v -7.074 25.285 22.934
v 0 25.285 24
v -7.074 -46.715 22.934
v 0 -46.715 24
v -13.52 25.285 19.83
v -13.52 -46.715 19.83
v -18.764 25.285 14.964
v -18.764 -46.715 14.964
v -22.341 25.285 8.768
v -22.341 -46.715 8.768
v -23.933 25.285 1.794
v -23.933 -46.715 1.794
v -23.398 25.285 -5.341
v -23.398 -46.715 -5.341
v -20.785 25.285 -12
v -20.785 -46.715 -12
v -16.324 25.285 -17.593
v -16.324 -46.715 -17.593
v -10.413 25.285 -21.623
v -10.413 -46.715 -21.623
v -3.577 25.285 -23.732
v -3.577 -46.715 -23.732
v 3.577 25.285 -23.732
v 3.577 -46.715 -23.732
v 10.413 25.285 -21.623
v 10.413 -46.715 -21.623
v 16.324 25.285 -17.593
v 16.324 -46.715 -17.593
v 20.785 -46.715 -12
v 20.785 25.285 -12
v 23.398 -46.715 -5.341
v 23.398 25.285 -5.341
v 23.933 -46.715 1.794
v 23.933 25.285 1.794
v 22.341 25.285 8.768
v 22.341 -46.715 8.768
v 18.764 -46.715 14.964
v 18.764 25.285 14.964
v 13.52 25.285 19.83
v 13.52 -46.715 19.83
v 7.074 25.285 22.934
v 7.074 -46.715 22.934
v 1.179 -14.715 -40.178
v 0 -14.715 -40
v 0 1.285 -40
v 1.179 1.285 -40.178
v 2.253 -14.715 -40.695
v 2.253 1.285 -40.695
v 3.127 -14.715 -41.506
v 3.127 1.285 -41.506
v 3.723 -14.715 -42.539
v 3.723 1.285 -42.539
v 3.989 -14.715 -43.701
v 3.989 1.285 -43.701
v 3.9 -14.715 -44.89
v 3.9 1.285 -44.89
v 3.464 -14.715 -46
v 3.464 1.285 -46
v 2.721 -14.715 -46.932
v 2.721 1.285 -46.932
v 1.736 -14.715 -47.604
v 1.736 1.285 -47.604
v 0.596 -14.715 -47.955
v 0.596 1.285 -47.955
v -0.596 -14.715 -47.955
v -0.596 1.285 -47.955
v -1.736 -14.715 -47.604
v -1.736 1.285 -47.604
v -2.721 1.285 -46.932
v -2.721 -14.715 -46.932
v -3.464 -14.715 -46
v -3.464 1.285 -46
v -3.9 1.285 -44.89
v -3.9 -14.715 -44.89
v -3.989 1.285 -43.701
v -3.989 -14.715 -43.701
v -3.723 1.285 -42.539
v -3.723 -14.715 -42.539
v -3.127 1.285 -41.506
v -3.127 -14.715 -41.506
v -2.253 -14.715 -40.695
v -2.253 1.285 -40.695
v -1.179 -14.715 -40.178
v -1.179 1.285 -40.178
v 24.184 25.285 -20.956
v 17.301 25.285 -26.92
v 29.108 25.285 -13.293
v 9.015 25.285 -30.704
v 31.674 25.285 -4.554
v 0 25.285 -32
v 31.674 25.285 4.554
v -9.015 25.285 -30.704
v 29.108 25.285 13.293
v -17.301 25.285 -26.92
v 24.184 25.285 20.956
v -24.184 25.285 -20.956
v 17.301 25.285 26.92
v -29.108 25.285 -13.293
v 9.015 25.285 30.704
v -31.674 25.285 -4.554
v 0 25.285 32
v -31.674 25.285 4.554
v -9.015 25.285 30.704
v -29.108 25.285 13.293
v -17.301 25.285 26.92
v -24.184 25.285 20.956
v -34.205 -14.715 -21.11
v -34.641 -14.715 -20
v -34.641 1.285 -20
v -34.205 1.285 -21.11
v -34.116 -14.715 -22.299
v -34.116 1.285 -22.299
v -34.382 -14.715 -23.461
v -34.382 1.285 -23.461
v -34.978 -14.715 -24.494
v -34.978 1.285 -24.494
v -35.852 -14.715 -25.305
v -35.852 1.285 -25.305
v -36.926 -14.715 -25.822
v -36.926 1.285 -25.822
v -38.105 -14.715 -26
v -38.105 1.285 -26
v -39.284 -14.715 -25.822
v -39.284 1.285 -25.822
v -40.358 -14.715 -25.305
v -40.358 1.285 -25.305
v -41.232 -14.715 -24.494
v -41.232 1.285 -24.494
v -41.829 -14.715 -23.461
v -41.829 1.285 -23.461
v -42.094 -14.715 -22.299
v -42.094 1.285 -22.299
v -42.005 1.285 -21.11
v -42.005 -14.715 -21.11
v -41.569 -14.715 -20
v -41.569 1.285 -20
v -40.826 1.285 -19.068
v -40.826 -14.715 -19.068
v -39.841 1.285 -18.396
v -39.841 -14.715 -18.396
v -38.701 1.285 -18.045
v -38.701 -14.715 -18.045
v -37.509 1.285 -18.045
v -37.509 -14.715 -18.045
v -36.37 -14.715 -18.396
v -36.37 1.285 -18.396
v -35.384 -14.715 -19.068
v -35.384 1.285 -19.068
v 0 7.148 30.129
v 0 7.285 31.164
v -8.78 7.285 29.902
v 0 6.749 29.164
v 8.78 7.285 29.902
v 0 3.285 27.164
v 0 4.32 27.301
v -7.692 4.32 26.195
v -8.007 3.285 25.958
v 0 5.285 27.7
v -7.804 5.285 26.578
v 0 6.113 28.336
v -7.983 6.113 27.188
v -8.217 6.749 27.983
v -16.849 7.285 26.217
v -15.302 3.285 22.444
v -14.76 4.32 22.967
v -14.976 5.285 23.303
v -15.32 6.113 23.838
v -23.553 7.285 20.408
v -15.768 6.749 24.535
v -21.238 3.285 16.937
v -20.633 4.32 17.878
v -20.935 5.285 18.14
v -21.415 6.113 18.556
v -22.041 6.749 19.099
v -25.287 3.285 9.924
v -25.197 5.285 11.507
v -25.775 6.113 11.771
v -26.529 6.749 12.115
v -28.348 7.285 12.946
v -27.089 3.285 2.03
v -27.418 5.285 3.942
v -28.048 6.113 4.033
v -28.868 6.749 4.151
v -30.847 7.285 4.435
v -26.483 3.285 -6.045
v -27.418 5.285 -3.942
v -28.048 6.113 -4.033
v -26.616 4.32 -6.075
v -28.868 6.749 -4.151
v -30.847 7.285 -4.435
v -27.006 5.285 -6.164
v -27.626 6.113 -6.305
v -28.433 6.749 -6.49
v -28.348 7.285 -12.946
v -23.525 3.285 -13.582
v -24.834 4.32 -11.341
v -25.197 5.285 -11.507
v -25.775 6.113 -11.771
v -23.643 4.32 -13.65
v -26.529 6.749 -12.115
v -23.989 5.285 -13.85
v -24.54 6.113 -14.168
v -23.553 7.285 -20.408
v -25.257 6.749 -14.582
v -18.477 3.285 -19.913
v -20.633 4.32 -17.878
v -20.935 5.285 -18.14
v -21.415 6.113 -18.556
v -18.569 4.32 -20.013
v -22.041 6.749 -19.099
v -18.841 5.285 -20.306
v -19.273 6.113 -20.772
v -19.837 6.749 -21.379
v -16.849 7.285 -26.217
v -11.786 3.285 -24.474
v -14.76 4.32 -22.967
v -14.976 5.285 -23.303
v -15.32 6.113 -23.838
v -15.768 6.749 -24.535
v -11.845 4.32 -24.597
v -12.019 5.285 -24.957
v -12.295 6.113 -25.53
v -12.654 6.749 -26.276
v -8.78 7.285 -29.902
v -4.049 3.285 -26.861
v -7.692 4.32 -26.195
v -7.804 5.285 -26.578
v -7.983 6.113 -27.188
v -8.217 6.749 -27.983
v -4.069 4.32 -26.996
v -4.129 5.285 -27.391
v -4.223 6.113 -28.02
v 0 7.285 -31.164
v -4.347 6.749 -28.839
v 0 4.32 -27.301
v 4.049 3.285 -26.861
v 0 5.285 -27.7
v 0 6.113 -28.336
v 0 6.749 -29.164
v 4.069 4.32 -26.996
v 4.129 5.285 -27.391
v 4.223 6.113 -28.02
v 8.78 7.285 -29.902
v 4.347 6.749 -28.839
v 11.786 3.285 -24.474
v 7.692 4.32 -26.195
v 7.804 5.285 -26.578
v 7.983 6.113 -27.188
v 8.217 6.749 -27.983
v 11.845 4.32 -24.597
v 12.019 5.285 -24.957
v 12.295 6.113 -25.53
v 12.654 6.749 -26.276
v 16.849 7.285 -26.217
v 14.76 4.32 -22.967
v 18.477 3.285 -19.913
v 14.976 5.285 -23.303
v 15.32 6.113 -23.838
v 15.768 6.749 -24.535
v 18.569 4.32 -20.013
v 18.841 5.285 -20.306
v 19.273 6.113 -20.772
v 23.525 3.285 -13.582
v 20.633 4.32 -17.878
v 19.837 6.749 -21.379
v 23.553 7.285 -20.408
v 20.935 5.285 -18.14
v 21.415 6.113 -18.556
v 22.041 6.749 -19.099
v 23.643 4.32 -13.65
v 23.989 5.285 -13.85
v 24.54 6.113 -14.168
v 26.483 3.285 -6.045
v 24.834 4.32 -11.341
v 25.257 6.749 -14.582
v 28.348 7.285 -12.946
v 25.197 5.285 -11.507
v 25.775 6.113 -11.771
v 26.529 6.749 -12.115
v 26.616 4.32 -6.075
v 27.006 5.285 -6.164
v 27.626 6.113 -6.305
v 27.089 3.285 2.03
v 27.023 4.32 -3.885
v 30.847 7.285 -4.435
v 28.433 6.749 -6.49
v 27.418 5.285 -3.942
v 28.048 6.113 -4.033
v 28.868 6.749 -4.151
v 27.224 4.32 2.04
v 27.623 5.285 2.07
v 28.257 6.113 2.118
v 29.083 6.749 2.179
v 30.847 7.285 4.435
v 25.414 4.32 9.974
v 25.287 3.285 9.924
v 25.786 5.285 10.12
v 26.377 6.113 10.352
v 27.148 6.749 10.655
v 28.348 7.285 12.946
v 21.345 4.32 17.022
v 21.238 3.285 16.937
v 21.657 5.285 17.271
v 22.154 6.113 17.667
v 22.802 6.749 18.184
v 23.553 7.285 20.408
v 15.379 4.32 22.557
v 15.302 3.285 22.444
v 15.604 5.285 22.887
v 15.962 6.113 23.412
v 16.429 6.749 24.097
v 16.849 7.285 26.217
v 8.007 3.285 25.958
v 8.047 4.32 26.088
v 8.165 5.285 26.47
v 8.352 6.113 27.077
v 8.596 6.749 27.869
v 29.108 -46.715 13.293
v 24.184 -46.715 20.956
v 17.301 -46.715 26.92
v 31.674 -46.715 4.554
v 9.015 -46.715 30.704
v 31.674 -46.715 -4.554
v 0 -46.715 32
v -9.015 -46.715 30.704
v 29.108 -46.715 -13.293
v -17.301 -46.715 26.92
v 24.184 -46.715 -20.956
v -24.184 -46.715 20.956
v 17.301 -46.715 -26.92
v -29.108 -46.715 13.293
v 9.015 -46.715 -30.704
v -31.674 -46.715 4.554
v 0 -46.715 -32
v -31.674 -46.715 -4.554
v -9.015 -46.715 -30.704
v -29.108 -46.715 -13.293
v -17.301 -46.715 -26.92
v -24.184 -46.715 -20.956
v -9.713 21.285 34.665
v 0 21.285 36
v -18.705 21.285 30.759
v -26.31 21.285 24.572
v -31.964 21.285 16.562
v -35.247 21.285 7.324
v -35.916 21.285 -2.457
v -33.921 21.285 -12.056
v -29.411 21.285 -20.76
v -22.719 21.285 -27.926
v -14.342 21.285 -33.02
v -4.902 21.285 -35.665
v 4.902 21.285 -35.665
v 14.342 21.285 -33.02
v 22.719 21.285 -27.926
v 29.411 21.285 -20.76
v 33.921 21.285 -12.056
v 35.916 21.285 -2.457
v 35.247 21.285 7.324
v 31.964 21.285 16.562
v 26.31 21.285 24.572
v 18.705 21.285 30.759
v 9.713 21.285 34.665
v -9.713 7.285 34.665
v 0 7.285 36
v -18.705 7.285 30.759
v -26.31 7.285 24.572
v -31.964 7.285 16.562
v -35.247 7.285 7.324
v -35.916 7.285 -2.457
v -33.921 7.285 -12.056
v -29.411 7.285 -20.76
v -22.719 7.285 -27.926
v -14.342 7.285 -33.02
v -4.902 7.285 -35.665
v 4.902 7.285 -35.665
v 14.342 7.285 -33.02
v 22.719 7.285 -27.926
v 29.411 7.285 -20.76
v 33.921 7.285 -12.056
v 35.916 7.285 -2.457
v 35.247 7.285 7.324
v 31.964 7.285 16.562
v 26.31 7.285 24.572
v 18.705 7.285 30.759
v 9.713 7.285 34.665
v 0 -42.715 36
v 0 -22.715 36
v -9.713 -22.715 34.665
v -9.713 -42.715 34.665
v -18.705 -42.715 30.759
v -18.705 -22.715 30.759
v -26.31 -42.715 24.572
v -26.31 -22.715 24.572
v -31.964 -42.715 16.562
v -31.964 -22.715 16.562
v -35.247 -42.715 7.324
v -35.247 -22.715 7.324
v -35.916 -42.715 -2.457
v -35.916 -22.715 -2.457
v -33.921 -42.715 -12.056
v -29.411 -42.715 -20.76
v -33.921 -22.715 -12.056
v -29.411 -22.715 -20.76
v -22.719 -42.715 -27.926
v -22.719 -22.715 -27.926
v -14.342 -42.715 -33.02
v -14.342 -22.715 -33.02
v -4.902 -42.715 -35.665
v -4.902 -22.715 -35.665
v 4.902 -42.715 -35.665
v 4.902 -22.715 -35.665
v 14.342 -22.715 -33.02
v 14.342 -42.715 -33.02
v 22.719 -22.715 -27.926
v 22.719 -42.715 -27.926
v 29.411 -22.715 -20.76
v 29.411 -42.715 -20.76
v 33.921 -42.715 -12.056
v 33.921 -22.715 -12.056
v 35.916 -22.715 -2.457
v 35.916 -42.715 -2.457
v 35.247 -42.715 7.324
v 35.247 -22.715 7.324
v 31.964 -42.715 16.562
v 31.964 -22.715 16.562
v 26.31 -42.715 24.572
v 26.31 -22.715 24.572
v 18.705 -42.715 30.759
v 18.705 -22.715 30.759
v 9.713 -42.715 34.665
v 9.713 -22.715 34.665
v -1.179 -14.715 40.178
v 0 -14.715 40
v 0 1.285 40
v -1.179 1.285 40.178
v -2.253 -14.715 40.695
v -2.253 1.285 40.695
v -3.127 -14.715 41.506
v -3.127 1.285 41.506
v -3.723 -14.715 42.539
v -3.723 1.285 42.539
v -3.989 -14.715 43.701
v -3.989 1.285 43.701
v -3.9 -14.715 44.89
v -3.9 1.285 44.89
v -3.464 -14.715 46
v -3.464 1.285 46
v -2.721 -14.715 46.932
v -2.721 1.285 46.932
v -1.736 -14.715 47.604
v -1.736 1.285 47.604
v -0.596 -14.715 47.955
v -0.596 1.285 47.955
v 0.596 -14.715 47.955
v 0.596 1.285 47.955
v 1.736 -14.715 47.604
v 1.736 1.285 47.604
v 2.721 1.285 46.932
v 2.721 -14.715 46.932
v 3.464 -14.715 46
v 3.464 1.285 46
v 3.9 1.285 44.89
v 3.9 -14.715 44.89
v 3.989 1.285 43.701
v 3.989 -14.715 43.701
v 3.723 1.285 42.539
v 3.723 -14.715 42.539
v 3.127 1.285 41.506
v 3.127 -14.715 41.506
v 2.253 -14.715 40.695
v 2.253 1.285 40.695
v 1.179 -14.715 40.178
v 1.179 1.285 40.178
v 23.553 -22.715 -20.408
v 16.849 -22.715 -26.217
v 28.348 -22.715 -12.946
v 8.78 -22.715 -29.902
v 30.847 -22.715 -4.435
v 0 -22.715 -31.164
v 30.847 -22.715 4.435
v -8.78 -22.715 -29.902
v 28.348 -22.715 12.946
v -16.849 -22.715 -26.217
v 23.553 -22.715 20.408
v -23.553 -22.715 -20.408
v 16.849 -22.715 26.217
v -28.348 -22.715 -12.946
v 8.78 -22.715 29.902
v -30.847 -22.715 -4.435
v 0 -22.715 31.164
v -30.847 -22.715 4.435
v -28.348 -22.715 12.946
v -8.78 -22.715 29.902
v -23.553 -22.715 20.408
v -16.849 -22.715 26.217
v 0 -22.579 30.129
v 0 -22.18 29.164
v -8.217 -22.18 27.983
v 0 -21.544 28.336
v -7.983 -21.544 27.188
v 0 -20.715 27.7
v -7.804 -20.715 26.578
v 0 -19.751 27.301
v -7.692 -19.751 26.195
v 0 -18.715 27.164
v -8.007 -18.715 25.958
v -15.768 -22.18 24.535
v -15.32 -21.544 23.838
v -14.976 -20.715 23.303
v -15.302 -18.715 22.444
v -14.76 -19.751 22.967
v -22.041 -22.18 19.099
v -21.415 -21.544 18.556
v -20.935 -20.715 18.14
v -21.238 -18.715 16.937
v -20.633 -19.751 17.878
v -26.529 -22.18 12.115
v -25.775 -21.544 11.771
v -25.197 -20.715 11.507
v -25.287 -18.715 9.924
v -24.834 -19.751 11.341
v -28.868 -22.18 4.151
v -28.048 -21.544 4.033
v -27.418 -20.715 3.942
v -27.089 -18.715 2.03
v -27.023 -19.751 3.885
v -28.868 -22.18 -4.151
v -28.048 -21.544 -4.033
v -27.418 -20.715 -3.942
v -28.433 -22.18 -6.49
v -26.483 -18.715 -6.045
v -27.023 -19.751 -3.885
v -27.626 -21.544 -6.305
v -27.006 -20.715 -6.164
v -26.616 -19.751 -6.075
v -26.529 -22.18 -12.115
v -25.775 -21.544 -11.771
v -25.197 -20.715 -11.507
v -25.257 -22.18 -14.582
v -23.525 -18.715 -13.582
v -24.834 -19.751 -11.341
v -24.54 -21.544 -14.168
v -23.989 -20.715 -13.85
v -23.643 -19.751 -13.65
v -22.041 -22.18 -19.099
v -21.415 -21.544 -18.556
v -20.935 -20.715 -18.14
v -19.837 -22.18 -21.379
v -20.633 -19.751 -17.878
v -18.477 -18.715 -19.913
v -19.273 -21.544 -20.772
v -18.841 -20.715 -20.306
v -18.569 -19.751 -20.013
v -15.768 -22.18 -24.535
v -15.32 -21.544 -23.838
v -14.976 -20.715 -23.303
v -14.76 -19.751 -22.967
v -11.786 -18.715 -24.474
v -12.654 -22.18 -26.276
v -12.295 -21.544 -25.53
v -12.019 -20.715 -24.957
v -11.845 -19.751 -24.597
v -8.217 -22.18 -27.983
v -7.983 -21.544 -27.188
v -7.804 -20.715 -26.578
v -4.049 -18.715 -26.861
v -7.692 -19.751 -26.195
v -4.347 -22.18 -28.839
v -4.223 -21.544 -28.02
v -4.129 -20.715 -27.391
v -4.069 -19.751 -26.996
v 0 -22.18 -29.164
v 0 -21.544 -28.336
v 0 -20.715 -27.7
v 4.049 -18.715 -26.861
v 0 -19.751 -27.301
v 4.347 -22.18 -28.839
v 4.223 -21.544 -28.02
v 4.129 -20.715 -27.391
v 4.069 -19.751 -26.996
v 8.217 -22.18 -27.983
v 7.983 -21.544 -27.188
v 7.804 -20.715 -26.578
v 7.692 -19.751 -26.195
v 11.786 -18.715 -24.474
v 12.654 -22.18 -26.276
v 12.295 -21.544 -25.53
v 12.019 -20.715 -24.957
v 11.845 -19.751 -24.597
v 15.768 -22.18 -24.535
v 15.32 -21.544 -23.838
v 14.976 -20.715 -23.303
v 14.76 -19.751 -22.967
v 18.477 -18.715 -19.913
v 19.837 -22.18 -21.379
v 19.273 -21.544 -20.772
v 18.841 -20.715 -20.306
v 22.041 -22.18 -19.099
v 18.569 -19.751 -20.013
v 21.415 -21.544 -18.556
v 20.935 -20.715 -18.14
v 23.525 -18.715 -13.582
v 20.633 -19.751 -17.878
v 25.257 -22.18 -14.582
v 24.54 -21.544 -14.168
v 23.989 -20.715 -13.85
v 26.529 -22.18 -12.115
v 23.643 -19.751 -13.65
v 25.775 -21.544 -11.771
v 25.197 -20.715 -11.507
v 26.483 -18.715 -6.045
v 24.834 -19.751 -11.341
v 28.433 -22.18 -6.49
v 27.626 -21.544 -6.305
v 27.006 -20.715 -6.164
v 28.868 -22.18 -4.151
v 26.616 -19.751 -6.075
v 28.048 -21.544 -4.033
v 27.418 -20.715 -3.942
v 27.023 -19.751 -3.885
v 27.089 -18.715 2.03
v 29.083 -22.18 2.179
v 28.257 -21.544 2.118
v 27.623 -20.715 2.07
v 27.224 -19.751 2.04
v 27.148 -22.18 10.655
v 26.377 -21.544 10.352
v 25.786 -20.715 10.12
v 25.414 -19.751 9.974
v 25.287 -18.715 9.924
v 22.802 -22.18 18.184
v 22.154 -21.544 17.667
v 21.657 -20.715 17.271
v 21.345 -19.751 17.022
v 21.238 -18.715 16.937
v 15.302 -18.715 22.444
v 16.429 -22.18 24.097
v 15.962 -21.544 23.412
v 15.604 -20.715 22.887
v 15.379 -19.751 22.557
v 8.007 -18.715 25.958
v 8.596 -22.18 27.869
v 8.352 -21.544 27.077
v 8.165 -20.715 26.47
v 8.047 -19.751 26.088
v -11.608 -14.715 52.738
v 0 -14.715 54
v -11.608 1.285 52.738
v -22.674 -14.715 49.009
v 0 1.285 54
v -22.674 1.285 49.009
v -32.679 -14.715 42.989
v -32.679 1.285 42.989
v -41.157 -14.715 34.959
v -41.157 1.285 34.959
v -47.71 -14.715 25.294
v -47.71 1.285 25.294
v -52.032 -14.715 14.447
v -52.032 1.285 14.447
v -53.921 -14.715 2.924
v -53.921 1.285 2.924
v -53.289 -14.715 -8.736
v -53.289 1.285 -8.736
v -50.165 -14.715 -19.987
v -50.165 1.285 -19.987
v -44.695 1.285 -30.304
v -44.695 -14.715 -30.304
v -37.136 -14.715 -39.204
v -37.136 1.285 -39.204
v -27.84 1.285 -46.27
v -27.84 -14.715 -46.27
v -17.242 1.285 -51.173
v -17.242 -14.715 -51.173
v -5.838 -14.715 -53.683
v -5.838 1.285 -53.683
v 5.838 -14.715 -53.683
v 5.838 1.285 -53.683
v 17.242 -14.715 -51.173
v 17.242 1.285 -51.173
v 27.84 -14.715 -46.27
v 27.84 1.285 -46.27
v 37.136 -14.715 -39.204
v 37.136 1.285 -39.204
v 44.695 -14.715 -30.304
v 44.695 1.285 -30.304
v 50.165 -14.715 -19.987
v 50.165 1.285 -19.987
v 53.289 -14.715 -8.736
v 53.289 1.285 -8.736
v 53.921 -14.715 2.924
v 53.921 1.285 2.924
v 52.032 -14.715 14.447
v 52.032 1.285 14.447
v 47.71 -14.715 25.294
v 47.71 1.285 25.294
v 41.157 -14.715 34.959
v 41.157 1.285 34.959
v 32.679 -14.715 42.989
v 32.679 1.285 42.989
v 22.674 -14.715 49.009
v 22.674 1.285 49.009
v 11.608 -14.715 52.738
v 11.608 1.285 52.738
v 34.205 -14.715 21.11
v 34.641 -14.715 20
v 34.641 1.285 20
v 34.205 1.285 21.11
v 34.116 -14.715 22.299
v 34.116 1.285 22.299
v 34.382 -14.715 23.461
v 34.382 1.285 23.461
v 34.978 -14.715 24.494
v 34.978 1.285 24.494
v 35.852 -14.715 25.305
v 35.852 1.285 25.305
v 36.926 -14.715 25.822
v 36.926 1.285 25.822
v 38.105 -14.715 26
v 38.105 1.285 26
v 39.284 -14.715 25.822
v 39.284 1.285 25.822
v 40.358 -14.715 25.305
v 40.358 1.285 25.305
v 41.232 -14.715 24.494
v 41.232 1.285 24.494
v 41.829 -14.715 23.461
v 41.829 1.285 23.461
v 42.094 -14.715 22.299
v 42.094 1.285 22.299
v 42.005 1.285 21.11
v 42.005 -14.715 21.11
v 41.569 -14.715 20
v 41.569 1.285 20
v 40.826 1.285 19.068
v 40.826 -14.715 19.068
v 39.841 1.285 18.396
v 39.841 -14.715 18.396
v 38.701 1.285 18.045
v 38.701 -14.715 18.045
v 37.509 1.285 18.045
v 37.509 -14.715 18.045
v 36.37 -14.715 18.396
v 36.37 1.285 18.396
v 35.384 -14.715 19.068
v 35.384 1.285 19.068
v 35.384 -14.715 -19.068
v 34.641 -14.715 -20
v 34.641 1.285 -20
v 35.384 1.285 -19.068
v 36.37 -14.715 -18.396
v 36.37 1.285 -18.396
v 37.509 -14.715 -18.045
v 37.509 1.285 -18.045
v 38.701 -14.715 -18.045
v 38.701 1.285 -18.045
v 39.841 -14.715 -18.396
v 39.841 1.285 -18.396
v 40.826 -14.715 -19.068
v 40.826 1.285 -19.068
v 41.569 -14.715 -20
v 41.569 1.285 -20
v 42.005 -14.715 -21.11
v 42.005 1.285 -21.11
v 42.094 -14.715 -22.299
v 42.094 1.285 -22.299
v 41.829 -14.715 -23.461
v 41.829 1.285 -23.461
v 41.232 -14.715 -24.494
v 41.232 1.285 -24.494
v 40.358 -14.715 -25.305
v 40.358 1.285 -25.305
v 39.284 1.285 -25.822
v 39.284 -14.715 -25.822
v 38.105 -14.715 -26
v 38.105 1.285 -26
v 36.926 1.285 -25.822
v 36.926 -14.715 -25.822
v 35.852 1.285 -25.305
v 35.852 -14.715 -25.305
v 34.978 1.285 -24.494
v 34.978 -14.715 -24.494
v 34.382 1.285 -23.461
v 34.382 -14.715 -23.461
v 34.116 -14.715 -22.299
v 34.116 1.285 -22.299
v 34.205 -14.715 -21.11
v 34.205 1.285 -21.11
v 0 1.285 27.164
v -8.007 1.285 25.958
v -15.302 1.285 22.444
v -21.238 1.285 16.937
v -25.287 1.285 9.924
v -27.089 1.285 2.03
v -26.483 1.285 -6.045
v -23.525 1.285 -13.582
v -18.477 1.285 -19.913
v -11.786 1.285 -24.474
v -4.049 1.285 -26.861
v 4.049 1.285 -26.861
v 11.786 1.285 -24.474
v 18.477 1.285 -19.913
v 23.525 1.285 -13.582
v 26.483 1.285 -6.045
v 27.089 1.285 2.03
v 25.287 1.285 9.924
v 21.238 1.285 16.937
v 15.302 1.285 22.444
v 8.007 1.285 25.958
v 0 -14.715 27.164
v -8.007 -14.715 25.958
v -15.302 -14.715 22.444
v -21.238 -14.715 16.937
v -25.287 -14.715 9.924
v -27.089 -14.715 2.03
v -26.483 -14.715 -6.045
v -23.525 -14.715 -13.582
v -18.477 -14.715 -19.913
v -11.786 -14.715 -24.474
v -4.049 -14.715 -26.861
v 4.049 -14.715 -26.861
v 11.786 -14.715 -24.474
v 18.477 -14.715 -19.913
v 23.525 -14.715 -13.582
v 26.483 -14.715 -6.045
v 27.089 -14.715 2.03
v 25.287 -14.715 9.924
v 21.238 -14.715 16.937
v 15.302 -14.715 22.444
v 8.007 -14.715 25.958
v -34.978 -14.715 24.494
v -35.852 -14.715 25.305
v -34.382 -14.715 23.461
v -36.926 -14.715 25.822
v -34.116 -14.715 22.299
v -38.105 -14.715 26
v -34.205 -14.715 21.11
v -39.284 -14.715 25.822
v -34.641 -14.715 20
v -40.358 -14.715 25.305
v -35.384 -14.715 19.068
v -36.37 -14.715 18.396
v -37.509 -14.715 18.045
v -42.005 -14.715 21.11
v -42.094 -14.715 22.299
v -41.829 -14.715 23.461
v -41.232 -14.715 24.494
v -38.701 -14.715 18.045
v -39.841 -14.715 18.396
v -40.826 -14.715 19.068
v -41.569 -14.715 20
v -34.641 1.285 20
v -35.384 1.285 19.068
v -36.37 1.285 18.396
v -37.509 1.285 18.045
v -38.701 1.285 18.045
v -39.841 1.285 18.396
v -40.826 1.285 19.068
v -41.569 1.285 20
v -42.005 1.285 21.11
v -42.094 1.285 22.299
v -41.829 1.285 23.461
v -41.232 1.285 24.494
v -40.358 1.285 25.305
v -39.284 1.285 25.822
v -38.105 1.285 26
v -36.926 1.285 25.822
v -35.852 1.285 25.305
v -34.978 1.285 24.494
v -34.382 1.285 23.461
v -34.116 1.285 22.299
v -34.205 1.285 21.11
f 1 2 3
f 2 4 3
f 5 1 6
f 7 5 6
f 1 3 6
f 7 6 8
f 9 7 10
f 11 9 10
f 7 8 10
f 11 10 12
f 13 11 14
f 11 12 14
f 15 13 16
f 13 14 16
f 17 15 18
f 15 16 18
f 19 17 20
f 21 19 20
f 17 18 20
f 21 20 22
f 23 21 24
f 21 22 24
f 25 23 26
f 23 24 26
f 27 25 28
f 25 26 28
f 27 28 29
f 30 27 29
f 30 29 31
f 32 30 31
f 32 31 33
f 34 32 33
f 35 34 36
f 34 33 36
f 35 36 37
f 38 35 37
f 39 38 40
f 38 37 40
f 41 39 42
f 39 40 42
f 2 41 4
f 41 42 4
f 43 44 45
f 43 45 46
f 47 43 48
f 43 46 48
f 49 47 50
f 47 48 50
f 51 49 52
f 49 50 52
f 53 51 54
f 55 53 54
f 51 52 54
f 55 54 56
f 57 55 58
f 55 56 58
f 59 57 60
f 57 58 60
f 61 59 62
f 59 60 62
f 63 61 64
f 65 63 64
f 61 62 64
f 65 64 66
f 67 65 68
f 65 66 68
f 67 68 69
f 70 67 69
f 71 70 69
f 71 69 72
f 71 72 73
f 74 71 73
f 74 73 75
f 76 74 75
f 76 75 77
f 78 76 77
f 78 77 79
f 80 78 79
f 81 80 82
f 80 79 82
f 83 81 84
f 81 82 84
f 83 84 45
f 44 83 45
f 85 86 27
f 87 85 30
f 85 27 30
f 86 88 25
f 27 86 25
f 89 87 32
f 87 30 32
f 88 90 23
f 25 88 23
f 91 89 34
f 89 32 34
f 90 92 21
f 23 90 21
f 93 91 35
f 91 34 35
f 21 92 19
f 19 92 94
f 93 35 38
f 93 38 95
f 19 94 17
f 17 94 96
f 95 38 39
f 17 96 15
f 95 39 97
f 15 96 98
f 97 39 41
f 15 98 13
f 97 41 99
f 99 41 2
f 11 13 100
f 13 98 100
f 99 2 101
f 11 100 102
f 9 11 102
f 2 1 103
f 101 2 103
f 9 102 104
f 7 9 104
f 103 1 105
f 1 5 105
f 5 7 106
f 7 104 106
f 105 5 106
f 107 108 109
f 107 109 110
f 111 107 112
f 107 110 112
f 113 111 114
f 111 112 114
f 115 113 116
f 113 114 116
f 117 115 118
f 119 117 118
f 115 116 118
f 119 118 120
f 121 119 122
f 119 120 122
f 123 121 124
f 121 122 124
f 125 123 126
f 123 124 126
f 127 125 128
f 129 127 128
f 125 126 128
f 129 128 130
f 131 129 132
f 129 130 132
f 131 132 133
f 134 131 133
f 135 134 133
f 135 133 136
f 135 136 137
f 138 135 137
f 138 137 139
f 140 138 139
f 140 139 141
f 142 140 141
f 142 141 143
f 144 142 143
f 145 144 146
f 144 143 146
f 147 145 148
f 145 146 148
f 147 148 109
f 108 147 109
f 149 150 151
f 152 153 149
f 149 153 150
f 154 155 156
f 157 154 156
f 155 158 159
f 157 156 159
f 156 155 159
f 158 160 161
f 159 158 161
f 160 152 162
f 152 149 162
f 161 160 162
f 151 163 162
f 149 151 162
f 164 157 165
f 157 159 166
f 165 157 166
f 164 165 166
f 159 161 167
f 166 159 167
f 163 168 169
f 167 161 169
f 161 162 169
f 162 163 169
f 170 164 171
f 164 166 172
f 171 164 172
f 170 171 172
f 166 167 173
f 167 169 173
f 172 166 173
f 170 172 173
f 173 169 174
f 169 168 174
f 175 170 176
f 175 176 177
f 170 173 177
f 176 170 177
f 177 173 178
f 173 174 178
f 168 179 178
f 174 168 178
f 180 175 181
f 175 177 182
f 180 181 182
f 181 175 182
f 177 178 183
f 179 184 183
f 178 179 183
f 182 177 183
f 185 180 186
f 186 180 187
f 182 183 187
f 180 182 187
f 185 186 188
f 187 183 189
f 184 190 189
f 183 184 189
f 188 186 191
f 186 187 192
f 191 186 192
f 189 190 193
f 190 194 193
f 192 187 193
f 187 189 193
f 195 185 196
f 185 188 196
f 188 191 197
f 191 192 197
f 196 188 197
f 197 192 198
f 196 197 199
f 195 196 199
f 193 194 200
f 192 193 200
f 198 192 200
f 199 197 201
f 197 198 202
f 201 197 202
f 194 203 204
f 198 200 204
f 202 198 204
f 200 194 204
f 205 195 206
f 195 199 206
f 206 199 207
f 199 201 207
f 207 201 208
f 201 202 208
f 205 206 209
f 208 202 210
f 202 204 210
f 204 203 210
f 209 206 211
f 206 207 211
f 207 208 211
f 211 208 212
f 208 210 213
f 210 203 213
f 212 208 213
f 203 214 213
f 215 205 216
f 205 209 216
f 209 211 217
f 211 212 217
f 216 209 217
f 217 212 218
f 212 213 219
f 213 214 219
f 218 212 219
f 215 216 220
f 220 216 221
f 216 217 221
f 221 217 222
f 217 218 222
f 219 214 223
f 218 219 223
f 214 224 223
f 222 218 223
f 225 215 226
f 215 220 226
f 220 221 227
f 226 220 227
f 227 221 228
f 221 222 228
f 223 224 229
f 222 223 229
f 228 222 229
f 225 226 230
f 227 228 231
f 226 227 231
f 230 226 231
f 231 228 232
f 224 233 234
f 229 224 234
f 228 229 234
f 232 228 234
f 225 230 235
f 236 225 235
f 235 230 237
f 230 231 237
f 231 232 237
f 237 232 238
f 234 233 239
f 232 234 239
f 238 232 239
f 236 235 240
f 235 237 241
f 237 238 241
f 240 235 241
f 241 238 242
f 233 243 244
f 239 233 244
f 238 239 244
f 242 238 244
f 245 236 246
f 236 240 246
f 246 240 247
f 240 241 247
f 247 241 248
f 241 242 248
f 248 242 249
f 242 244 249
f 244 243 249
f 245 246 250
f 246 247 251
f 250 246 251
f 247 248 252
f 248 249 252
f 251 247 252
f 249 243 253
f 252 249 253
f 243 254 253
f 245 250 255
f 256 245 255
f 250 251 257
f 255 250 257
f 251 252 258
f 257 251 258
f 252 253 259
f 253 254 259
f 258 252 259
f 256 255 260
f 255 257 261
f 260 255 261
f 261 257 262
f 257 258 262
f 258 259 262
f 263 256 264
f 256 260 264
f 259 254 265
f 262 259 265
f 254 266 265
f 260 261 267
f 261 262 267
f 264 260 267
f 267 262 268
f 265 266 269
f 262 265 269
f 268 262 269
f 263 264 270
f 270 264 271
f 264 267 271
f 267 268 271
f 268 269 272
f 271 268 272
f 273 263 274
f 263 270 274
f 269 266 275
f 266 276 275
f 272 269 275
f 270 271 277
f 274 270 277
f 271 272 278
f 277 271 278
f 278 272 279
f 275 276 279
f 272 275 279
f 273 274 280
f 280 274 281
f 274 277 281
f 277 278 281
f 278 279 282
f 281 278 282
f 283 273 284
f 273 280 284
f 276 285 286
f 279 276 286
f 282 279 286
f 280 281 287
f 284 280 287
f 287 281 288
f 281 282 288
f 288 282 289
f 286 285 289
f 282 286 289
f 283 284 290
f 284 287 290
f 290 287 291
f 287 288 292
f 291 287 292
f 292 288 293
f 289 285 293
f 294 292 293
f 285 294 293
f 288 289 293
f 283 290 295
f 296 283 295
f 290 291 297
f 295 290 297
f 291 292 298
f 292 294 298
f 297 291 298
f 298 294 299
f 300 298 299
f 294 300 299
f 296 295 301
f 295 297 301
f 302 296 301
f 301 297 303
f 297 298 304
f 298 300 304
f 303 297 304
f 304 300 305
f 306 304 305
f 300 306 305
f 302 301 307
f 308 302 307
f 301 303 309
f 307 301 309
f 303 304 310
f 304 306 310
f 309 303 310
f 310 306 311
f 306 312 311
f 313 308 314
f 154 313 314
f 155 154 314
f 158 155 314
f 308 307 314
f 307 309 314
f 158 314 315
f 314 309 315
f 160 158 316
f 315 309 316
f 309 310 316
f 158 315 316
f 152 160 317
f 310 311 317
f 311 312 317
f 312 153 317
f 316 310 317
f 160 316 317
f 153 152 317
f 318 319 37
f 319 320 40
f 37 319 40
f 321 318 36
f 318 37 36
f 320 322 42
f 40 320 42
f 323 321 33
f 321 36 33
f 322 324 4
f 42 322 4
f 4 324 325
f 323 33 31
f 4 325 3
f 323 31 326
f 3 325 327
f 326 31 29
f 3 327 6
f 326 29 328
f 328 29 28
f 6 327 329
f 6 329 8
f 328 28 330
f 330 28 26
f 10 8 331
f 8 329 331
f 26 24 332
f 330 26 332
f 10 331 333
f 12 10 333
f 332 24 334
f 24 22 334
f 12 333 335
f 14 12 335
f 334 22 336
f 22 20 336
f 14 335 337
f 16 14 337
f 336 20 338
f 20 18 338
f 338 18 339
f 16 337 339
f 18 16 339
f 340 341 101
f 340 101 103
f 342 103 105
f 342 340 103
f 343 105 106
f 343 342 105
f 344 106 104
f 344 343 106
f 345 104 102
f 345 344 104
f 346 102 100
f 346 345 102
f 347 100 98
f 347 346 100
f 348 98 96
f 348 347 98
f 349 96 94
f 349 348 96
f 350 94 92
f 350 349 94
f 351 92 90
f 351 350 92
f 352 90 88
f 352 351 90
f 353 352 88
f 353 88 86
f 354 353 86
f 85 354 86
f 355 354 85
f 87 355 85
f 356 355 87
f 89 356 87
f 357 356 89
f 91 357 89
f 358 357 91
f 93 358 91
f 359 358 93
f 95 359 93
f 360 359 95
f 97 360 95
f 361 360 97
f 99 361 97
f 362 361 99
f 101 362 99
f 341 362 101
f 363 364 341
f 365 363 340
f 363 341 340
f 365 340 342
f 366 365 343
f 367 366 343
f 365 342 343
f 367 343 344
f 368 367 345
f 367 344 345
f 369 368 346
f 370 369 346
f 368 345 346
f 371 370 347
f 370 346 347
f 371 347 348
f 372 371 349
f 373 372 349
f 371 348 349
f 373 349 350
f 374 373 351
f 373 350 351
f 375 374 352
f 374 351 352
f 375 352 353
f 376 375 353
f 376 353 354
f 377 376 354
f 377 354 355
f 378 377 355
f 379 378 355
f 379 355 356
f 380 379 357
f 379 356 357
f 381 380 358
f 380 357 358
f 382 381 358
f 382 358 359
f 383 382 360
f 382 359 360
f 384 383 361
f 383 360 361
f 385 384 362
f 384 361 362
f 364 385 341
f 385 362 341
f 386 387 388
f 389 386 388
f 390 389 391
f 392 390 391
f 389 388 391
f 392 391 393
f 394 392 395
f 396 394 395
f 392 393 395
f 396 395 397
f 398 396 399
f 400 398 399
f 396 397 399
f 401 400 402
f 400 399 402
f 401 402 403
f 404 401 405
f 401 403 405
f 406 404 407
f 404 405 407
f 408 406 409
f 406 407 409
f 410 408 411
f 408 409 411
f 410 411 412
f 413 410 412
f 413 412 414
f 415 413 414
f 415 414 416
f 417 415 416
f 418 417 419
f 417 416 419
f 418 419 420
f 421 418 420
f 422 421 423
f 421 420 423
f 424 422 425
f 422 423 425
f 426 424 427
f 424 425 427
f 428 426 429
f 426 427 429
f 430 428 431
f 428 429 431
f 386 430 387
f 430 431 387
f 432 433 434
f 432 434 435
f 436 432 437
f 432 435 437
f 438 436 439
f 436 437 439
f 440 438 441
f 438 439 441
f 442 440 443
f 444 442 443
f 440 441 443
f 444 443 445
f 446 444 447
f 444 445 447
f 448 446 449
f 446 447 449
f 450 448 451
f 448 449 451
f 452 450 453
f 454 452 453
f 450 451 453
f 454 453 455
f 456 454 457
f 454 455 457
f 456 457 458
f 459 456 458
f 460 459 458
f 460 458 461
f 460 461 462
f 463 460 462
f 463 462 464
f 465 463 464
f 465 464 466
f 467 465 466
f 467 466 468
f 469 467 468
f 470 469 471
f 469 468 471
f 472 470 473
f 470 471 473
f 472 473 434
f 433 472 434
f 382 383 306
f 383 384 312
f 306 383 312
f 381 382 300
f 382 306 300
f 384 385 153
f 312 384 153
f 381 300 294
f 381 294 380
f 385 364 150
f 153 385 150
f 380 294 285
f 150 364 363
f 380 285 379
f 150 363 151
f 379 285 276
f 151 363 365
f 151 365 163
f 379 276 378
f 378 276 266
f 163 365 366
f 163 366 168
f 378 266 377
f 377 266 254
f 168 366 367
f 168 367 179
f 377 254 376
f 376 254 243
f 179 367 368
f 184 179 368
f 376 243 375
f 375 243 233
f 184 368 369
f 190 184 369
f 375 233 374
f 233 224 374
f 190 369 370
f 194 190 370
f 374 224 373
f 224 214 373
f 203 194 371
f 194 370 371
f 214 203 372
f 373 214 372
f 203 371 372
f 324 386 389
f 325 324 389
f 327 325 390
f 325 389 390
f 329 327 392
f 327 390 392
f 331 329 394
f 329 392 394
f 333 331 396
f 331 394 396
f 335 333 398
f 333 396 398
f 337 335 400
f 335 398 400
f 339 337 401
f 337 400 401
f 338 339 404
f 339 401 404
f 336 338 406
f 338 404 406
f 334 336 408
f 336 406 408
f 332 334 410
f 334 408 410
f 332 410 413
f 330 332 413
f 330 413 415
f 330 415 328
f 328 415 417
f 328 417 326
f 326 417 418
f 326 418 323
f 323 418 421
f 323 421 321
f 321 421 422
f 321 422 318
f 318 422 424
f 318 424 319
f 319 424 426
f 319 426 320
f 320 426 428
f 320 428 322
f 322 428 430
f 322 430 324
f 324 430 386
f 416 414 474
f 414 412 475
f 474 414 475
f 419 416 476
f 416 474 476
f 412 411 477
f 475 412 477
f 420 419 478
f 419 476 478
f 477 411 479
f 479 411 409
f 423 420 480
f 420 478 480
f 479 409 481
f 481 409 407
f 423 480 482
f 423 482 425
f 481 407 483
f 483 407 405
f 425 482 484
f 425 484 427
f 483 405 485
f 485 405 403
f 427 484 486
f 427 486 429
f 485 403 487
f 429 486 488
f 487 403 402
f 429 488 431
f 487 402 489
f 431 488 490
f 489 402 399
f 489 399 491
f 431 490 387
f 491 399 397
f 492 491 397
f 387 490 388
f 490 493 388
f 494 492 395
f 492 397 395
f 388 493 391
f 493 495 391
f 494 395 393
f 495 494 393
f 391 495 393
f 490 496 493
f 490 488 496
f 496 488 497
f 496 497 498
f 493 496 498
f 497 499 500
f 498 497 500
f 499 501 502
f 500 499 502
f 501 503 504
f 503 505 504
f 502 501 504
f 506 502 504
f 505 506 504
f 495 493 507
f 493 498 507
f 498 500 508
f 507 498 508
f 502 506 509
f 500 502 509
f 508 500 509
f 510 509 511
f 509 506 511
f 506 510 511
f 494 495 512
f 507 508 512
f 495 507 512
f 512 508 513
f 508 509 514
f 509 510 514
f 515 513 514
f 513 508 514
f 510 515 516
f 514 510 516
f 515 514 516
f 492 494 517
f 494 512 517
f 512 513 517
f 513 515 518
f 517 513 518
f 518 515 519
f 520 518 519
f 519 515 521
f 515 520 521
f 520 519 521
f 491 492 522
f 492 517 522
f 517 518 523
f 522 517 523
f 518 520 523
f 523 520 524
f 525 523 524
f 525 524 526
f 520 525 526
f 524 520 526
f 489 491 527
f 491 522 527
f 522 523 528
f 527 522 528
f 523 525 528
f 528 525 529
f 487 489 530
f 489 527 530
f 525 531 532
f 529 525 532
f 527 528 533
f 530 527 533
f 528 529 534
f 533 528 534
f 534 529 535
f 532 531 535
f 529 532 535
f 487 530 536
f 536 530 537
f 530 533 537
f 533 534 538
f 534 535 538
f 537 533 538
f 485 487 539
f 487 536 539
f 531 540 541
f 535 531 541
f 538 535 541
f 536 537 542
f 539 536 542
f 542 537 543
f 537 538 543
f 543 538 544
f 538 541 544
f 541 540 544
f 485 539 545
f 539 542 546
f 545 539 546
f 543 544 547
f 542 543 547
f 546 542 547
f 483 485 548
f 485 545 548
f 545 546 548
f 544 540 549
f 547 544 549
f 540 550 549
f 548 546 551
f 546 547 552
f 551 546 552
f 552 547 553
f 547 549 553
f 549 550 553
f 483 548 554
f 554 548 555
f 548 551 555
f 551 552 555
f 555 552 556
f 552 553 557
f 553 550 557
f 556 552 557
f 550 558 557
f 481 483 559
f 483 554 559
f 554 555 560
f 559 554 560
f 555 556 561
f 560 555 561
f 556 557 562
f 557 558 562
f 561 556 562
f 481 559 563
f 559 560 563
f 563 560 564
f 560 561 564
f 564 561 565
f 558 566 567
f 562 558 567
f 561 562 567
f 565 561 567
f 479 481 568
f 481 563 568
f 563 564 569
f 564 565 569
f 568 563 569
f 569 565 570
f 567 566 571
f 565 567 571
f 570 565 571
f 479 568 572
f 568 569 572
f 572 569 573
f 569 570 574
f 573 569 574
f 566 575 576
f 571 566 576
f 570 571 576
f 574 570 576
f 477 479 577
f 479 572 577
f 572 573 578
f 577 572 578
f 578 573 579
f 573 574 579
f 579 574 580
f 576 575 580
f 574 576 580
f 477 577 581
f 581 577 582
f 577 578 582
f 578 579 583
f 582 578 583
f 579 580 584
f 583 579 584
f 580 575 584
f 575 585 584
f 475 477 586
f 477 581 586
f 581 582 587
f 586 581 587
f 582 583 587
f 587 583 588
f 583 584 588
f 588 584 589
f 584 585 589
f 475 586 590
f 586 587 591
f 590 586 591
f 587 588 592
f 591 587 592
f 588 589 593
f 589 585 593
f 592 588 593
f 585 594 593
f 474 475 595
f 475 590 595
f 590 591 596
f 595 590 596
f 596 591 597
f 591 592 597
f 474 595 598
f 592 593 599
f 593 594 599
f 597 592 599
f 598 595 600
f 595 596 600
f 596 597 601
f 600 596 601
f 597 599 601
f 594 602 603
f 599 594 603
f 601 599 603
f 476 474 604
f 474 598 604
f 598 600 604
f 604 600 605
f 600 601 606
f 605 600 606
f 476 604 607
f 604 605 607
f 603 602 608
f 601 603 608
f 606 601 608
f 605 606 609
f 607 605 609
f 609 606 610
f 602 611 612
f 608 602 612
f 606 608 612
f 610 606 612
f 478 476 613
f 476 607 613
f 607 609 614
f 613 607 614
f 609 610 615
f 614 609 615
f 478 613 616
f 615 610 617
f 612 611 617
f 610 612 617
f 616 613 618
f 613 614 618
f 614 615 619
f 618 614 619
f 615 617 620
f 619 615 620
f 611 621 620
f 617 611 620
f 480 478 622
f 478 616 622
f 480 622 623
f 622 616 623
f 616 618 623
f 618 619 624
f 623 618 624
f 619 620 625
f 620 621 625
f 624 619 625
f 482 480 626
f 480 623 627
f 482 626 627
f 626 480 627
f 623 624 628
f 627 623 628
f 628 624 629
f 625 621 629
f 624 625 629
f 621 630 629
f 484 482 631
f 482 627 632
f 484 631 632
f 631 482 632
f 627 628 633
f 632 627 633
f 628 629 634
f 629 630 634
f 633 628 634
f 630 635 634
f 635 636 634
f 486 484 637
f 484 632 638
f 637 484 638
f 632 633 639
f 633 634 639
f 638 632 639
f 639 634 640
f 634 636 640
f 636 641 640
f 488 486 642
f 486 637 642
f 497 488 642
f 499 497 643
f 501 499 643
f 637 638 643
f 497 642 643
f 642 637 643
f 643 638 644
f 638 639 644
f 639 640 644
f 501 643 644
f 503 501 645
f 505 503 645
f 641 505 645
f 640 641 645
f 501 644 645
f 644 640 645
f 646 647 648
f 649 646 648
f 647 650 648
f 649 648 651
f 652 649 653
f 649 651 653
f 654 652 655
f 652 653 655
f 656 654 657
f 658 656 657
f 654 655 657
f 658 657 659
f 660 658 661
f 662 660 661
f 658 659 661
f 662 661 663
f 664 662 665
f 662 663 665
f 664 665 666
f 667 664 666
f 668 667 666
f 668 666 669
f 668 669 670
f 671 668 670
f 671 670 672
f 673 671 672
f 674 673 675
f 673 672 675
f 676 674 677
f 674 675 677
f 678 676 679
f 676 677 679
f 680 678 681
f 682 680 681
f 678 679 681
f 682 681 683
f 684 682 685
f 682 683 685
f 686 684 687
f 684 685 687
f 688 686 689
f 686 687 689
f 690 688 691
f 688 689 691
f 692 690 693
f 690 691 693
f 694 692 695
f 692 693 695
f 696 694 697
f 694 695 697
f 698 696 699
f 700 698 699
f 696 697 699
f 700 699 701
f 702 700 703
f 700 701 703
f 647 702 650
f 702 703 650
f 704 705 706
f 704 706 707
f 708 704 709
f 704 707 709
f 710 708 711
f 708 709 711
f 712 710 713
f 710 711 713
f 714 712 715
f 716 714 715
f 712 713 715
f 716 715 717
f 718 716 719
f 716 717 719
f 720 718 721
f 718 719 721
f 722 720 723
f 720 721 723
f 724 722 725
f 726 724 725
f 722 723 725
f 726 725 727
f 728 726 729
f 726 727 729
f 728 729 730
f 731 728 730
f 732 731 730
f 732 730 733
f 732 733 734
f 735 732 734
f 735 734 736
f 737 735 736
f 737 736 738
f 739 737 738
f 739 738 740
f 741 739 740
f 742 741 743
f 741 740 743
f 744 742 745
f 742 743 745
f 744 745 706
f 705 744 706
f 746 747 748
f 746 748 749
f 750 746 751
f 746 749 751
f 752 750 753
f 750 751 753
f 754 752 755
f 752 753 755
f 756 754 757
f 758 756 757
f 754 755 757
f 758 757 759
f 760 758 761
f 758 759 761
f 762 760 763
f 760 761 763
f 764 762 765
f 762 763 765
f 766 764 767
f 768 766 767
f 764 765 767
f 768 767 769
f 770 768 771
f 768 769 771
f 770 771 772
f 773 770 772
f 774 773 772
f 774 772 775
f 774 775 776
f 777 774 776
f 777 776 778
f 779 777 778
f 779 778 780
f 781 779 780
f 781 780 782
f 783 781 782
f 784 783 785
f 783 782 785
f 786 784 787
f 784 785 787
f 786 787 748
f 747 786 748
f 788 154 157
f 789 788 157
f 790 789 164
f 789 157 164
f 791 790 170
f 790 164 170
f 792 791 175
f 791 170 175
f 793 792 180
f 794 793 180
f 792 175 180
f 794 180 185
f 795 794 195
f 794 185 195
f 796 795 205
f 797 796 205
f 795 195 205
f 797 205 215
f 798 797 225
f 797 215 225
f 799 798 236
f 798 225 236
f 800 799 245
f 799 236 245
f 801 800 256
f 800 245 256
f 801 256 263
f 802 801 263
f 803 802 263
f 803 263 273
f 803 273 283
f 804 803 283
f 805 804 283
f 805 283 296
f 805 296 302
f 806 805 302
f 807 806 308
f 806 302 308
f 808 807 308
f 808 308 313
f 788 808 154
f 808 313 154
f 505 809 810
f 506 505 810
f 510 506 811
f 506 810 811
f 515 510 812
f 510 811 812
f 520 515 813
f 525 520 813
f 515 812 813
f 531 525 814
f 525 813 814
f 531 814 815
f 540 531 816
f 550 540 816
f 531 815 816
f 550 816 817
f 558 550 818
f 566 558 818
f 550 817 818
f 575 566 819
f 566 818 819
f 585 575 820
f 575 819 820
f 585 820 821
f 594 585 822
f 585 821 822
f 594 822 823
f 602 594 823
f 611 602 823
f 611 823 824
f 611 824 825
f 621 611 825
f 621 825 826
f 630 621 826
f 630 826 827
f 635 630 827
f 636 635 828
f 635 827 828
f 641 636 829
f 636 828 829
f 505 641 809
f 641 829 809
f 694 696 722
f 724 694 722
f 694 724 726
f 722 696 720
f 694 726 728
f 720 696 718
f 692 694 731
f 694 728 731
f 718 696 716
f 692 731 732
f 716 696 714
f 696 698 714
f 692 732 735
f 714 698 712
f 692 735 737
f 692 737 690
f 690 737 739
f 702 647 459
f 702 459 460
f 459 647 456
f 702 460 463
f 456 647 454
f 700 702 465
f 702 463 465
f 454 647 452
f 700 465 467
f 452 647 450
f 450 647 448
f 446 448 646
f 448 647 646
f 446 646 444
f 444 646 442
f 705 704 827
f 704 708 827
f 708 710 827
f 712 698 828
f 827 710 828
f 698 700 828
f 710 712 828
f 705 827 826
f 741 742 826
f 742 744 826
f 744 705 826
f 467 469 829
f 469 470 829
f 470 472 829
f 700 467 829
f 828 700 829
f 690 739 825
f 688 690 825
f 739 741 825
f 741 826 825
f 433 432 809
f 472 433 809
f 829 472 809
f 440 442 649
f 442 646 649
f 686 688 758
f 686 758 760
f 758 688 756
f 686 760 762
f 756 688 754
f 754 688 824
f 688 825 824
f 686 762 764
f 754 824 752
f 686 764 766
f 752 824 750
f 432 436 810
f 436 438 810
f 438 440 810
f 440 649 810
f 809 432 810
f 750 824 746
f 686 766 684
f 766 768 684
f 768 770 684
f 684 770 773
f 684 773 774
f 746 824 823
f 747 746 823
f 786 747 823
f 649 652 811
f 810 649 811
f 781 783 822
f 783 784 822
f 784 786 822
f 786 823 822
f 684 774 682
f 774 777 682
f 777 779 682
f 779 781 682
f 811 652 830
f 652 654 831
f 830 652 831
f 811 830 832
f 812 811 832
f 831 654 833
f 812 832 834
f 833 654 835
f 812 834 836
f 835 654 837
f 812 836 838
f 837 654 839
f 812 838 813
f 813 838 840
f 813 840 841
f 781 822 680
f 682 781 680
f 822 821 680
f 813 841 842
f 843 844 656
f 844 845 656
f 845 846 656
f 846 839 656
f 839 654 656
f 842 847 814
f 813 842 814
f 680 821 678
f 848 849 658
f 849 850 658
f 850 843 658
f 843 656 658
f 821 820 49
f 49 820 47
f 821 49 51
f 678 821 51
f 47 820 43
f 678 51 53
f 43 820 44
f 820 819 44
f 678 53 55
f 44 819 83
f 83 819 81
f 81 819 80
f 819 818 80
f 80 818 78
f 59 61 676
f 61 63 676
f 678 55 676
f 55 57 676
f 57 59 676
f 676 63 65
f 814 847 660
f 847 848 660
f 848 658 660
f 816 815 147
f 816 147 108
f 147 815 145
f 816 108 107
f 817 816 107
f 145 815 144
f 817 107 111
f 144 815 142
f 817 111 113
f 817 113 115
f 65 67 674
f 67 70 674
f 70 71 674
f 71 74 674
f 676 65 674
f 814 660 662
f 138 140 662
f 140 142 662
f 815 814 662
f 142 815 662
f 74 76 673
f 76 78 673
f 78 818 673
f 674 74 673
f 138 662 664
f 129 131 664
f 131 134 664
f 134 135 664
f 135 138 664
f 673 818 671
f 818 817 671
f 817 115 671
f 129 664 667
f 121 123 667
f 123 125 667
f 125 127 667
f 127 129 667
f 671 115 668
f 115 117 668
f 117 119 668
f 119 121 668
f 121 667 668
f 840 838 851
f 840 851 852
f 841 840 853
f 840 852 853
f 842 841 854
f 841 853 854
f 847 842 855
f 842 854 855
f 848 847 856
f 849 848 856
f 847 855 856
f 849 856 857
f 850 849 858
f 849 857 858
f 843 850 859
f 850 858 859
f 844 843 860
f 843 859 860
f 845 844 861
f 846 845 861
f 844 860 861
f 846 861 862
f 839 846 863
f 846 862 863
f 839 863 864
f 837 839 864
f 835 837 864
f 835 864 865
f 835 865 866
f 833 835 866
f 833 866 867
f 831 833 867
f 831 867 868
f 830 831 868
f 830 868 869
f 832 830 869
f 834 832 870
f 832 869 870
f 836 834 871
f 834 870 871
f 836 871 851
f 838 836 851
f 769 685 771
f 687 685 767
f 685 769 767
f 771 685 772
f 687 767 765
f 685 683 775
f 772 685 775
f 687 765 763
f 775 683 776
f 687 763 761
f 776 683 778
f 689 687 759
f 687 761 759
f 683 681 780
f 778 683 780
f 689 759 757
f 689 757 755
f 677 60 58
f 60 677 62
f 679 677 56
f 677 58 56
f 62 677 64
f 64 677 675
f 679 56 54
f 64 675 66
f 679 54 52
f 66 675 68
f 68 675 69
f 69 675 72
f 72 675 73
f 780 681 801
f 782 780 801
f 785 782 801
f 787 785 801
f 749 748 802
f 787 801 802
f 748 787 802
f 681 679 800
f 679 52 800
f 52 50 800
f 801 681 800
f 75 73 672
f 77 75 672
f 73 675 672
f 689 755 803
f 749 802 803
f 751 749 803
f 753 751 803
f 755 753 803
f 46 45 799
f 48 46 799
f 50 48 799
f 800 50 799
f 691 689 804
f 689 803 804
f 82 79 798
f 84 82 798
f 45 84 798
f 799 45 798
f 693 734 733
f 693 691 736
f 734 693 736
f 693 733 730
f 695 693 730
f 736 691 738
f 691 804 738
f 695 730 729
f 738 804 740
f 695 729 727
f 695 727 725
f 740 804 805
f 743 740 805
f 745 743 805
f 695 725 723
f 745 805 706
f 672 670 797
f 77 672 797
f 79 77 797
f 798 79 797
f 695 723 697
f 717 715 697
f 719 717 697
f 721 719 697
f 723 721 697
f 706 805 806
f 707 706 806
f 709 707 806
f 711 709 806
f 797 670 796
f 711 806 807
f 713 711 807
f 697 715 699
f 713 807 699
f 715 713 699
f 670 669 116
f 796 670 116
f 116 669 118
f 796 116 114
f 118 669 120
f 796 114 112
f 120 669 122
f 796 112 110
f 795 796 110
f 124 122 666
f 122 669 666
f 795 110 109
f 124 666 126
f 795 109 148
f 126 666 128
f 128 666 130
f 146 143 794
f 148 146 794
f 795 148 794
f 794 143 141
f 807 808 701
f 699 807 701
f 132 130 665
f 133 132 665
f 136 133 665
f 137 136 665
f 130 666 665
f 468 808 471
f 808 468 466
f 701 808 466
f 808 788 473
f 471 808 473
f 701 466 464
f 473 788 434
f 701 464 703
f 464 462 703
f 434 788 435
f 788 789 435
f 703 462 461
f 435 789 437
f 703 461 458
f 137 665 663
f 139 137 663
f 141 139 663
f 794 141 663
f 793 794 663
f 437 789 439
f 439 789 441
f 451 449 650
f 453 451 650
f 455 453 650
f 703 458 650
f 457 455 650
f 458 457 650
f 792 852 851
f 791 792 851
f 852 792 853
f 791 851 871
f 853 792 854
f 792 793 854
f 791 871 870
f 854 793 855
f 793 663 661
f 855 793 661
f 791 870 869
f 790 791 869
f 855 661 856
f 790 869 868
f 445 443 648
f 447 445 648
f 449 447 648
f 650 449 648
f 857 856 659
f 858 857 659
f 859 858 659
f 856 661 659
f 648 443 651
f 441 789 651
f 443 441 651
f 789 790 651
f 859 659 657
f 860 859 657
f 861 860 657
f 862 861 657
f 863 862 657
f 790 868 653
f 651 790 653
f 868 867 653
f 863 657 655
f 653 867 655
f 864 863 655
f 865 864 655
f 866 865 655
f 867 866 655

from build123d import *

# Parameters (mm, degrees)
SKETCH2_R          = 4
CUT_EXTRUDE1_DEPTH = 16
CIRPATTERN1_COUNT  = 6
CHAMFER1_SIZE      = 4
CHAMFER2_SIZE      = 4
FILLET1_R          = 4
FILLET2_R          = 4


with BuildPart() as part:
    # Sketch1 → Revolve1 (revolve)
    with BuildSketch(Plane.XY, mode=Mode.PRIVATE) as revolve1_sk:
        Polygon((24, -46.7154047), (36, -46.7154047), (36, -22.7154047), (27.164490862, -22.7154047), (27.164490862, -14.7154047), (54, -14.7154047), (54, 1.2845953), (27.164490862, 1.2845953), (27.164490862, 7.2845953), (36, 7.2845953), (36, 25.2845953), (24, 25.2845953), align=None)
    revolve(revolve1_sk.sketch.rotate(Axis((0, 63.408022787, 0), (0, -1, 0)), 90), axis=Axis((0, 63.408022787, 0), (0, -1, 0)))

    # Sketch2 → Cut-Extrude1 (cut)
    with BuildSketch(Plane(origin=(0, 1.2845953, 0), x_dir=(1, 0, 0), z_dir=(0, 1, 0))):
        with Locations(Location((0, 44, 0), (0, 0, 270))):
            Circle(SKETCH2_R)
    cut_extrude1 = extrude(amount=-CUT_EXTRUDE1_DEPTH, mode=Mode.SUBTRACT)

    # CirPattern1: Cut-Extrude1 ×6 about axis
    cirpattern1_axis = Axis((0, 0, 0), (0, 1, 0))
    for i in range(1, CIRPATTERN1_COUNT):
        add(cut_extrude1.rotate(cirpattern1_axis, i * 360 / CIRPATTERN1_COUNT), mode=Mode.SUBTRACT)

    # Chamfer1
    chamfer1_edges = [part.edges().sort_by_distance(p)[0] for p in [
        (0, 25.2845953, -36),
    ]]
    chamfer(chamfer1_edges, length=CHAMFER1_SIZE)

    # Chamfer2
    chamfer2_edges = [part.edges().sort_by_distance(p)[0] for p in [
        (0, -46.7154047, -36),
    ]]
    chamfer(chamfer2_edges, length=CHAMFER2_SIZE)

    # Fillet1
    fillet1_edges = [part.edges().sort_by_distance(p)[0] for p in [
        (0, -22.7154047, -27.164490862),
    ]]
    fillet(fillet1_edges, radius=FILLET1_R)

    # Fillet2
    fillet2_edges = [part.edges().sort_by_distance(p)[0] for p in [
        (0, 7.2845953, -27.164490862),
    ]]
    fillet(fillet2_edges, radius=FILLET2_R)


solid = part.part
